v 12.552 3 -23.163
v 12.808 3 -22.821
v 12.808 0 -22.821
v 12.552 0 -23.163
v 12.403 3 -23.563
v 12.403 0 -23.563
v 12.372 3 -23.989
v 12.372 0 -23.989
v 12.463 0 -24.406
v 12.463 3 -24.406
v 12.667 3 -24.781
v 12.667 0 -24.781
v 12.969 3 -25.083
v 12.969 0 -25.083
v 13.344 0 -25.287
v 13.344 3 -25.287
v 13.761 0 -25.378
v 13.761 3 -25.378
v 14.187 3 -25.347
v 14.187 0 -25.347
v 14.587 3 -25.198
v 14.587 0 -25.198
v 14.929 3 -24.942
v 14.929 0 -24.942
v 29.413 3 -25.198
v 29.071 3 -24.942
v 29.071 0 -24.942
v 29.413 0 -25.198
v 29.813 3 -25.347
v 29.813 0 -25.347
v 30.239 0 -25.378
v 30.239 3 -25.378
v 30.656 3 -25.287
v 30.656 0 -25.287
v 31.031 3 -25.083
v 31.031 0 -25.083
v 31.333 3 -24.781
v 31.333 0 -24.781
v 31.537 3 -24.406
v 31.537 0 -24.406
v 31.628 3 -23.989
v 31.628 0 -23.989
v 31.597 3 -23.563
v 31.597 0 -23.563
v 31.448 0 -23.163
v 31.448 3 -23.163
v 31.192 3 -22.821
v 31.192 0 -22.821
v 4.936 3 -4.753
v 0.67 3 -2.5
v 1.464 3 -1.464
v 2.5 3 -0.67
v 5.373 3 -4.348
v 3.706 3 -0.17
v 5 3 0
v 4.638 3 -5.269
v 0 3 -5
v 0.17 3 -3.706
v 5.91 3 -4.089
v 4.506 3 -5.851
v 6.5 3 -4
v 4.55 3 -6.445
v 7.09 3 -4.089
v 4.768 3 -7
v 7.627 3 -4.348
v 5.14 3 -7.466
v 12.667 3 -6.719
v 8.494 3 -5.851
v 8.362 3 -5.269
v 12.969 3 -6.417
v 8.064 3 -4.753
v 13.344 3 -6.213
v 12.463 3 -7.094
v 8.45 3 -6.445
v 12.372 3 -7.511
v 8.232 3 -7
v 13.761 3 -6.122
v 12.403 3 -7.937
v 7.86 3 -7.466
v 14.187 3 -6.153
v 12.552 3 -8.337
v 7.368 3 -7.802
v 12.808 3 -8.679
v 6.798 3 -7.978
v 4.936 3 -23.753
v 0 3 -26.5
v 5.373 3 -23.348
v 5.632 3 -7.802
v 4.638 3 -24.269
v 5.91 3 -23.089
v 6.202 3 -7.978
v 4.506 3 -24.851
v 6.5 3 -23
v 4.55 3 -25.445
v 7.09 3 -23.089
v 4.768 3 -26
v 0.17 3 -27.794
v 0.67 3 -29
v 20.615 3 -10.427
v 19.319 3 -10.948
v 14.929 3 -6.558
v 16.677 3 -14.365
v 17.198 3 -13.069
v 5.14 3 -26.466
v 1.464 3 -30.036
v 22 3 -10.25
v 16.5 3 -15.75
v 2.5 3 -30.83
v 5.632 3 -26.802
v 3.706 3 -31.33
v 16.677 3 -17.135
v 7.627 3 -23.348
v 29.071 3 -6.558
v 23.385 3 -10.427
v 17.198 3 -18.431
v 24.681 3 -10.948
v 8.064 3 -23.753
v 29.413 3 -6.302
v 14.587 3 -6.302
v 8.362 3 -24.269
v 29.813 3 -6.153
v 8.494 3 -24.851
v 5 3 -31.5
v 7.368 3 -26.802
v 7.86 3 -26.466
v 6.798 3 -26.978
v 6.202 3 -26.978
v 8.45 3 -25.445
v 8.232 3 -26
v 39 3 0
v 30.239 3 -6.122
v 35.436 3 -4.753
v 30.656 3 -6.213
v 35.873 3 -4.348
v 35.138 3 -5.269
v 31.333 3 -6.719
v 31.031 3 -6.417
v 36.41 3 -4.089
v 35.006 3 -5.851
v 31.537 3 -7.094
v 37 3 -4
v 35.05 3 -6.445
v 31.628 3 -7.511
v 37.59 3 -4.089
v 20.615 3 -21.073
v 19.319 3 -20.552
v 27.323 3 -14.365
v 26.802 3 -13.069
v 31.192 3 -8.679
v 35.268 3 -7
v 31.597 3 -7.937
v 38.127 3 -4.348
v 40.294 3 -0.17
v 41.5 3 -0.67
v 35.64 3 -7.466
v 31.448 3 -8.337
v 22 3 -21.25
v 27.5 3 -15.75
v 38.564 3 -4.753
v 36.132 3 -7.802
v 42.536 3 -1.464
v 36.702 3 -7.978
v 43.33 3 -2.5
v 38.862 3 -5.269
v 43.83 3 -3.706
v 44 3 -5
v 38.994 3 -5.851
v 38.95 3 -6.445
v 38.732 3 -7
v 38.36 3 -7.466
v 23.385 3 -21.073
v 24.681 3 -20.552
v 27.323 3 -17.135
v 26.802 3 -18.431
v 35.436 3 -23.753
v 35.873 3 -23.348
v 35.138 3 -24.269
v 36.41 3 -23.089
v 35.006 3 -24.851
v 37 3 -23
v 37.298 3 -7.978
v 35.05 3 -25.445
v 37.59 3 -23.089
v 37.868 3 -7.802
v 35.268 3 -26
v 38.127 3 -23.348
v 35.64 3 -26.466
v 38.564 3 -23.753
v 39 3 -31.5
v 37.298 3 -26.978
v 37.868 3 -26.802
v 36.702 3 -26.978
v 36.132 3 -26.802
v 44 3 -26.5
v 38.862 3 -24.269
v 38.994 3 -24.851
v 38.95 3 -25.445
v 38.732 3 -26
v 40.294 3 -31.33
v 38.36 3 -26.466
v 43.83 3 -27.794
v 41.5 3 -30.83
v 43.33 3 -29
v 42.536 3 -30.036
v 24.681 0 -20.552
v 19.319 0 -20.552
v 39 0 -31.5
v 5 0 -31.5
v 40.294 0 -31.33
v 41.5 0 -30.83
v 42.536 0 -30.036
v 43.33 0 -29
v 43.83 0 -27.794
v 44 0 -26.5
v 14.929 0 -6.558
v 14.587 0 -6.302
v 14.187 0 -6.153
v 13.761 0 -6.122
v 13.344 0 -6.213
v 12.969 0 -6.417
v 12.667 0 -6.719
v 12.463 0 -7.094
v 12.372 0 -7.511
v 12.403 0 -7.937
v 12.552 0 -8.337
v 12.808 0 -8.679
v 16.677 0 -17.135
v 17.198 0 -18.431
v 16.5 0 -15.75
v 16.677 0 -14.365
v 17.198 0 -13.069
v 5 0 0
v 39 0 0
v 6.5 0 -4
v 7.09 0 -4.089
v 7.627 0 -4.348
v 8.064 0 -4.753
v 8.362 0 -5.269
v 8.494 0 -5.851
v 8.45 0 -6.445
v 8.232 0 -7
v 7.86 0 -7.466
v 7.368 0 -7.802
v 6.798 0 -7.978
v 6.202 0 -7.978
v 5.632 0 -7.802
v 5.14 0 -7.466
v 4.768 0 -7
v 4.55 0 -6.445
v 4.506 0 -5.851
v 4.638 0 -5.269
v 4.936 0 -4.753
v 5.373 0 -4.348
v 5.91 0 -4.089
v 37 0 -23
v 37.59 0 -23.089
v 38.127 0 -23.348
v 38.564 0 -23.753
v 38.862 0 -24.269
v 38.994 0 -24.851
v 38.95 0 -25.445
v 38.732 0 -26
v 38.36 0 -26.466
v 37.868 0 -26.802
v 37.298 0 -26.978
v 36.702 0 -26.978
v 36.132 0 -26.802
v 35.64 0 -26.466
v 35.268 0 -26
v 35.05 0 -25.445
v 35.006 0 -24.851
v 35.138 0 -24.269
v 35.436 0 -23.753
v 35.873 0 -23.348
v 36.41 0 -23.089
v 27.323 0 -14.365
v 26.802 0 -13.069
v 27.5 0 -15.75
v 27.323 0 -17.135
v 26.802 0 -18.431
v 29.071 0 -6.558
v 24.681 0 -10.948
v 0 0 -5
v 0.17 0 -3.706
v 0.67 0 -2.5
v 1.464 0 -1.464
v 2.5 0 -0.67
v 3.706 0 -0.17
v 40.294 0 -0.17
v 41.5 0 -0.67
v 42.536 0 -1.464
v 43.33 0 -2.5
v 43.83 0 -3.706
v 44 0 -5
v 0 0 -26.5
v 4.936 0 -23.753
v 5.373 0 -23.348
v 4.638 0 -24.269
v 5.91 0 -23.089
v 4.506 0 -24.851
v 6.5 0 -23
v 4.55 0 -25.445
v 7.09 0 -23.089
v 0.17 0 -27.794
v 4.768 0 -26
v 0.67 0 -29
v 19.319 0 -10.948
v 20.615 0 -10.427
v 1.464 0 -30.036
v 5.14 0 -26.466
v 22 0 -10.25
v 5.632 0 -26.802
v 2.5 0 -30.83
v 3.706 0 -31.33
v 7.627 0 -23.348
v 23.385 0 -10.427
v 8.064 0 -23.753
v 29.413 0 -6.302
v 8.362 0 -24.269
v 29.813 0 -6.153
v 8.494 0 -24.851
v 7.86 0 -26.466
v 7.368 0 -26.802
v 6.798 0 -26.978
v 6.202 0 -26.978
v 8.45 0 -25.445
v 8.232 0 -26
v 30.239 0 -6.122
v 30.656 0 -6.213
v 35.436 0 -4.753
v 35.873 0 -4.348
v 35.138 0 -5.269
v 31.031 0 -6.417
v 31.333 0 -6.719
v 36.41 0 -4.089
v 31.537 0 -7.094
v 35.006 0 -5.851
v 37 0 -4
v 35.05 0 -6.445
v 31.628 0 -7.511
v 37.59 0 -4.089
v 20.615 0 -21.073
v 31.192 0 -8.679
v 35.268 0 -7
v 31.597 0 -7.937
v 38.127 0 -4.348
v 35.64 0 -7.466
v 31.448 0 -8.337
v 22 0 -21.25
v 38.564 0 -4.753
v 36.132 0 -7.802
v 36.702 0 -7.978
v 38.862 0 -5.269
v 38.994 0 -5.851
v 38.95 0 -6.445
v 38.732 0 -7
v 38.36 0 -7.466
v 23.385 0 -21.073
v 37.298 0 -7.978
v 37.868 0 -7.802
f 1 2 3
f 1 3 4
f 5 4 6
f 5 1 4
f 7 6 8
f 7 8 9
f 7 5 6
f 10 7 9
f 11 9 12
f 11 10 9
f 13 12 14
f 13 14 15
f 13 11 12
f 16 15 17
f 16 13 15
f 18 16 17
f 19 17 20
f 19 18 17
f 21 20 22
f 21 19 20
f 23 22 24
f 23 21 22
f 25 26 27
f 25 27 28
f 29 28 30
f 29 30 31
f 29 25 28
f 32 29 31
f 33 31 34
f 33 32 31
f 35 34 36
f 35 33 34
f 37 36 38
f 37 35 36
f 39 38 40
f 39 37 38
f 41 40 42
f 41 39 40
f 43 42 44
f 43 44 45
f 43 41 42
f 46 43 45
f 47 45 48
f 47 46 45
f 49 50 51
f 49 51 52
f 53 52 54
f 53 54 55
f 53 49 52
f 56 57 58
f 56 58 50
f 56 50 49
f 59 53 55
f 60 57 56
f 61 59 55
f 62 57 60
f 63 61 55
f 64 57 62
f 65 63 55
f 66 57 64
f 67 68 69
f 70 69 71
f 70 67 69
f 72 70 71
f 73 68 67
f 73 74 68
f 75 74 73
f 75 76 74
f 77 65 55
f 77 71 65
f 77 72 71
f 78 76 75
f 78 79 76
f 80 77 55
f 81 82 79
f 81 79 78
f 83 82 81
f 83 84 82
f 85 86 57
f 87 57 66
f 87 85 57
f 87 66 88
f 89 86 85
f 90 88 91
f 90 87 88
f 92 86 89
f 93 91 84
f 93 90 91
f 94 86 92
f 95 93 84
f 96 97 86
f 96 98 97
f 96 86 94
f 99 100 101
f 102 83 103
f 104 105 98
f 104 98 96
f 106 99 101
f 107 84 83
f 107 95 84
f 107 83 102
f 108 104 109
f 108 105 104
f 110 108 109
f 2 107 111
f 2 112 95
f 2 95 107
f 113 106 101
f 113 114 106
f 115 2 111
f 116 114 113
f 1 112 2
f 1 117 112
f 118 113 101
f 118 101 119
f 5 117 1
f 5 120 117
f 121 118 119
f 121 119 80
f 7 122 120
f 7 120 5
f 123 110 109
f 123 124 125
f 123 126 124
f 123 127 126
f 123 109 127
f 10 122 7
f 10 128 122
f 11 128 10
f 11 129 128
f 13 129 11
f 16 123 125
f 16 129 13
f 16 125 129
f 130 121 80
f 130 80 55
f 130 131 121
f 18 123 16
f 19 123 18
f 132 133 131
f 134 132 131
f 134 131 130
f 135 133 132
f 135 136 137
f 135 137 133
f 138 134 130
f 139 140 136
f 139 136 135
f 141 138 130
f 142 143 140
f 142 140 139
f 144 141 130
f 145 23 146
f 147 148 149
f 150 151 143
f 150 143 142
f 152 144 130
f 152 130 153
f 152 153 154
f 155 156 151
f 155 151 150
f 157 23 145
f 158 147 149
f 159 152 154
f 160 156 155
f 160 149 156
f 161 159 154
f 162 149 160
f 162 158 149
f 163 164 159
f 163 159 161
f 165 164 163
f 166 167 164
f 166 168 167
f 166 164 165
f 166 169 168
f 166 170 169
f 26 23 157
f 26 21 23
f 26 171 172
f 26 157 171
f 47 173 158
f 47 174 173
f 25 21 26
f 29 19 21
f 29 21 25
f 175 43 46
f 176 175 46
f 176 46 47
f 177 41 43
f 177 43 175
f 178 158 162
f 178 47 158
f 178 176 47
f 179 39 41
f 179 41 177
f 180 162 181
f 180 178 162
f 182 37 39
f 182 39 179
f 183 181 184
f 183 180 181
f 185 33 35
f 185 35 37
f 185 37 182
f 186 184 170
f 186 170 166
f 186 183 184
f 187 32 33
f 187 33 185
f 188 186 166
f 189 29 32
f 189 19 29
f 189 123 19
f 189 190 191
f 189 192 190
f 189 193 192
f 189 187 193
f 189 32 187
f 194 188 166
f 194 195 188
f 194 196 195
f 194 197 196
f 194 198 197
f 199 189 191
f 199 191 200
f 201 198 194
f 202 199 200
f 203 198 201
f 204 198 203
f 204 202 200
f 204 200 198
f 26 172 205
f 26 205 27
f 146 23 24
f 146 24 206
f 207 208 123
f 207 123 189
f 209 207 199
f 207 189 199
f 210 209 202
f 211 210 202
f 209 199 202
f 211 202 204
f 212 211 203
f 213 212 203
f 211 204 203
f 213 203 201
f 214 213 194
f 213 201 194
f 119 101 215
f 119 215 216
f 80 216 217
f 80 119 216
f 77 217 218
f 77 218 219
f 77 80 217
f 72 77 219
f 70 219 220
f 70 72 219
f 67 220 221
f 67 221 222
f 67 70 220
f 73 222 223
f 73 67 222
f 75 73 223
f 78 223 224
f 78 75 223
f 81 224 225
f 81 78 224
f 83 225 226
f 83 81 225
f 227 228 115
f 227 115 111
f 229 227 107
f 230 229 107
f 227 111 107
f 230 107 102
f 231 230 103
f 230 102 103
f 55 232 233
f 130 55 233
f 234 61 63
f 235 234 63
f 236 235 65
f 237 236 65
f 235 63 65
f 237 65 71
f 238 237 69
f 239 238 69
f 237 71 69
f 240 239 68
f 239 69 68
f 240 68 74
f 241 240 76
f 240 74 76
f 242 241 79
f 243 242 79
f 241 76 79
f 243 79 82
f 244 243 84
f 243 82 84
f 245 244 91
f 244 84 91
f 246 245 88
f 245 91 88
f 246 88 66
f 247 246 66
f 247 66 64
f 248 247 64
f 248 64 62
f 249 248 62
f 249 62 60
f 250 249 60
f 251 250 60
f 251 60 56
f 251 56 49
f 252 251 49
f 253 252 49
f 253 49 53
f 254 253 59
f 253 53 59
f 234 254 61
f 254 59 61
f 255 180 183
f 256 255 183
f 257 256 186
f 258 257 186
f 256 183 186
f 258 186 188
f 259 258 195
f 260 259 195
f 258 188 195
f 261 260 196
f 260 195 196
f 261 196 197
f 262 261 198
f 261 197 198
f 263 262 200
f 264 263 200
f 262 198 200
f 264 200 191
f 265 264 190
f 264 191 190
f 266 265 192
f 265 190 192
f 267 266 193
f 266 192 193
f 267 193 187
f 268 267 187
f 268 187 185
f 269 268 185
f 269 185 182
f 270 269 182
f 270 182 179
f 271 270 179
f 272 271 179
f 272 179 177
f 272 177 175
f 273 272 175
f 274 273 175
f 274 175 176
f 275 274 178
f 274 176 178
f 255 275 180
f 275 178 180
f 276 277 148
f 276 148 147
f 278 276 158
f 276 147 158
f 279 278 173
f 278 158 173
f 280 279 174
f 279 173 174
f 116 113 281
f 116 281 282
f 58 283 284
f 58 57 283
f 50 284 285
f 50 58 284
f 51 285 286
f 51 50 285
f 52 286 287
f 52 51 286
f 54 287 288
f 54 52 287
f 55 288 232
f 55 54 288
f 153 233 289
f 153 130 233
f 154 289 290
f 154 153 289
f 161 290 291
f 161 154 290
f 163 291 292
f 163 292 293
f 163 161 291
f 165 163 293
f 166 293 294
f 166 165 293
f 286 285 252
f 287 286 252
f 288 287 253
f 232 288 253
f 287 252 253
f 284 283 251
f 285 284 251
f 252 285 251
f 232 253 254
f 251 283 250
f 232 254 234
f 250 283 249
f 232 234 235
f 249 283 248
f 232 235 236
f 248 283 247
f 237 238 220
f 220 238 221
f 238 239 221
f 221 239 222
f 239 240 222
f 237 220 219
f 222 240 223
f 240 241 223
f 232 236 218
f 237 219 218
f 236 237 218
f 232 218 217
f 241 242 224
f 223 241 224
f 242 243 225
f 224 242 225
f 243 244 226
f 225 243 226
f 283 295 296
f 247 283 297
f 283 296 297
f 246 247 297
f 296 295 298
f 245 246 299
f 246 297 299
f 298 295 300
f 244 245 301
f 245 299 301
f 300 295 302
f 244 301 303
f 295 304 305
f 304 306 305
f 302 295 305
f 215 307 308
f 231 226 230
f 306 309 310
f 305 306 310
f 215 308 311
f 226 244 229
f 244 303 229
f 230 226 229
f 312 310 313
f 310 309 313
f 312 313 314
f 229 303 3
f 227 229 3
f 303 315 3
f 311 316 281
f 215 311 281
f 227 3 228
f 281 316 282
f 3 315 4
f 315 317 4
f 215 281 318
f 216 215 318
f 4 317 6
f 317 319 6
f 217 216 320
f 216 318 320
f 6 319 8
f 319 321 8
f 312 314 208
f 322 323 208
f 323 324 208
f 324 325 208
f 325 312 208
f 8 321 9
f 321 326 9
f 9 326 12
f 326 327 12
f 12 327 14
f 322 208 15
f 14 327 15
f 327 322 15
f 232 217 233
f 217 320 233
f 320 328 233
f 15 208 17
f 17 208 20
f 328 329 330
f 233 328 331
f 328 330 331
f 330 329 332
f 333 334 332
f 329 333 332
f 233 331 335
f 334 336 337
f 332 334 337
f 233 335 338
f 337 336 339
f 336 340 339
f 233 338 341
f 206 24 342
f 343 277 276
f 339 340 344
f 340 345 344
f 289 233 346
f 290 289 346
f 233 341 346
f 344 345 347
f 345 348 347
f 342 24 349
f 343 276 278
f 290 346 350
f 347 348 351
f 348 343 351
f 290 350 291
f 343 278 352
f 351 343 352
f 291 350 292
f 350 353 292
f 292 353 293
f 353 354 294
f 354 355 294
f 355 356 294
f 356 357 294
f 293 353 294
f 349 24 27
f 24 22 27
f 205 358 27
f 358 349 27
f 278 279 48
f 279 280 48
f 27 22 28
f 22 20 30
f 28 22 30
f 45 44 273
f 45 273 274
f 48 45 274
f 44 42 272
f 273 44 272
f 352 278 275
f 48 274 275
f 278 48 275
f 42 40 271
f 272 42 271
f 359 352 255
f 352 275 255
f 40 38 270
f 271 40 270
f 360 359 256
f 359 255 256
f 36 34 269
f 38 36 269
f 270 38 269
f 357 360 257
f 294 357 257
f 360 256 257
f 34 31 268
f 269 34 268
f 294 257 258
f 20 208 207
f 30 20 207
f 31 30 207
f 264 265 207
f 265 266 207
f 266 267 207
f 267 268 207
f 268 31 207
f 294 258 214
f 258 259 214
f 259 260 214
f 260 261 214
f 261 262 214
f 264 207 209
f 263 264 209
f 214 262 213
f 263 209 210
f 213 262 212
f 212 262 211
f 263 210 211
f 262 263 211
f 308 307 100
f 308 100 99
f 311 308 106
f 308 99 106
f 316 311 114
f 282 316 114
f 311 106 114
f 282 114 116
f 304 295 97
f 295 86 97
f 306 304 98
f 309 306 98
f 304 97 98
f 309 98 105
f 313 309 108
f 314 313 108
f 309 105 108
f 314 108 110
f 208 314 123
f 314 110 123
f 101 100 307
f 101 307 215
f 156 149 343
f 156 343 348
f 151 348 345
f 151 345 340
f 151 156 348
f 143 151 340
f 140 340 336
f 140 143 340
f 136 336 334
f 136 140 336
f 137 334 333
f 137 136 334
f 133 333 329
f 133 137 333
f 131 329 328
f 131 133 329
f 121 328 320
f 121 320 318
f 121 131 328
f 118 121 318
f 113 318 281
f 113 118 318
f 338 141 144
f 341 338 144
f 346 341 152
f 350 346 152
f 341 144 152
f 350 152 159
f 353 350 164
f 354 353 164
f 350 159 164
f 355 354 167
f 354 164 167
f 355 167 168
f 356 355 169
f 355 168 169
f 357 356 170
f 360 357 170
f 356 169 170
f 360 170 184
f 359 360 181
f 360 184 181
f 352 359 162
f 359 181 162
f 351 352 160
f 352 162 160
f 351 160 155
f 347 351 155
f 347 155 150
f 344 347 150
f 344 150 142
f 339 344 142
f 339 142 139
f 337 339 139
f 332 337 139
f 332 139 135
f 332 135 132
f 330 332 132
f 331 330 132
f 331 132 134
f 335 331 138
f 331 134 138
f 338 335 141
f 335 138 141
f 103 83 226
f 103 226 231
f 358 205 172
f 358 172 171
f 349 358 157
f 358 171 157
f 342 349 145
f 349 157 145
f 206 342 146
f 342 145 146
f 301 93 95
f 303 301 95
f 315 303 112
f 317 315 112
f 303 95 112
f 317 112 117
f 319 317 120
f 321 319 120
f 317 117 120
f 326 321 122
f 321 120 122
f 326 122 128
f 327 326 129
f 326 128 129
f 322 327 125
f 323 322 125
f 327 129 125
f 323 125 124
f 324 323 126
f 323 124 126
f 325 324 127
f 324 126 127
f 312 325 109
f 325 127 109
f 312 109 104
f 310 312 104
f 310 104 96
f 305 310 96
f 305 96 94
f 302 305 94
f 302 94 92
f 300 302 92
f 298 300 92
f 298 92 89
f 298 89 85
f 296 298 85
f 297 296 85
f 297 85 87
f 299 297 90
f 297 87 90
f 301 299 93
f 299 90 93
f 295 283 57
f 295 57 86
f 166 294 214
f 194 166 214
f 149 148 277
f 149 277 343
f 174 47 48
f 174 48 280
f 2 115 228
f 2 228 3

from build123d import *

# Parameters (mm, degrees)
SKETCH1_W            = 44
SKETCH1_H            = 31.5
BOSS_EXTRUDE1_DEPTH  = 3
SKETCH2_R            = 5.5
CUT_EXTRUDE1_DEPTH   = 3
CUT_EXTRUDE2_DEPTH   = 3
CUT_EXTRUDE3_DEPTH   = 3
SKETCH5_R            = 2
CUT_EXTRUDE4_DEPTH   = 3
LPATTERN1_COUNT      = 2
LPATTERN1_PITCH      = 30.5
LPATTERN1_COUNT_DIR2 = 2
LPATTERN1_PITCH_DIR2 = 19
FILLET1_R            = 5


with BuildPart() as part:
    # Sketch1 → Boss-Extrude1 (new body)
    with BuildSketch(Plane(origin=(0, 0, 0), x_dir=(1, 0, 0), z_dir=(0, 1, 0))):
        with Locations((22, 15.75)):
            Rectangle(SKETCH1_W, SKETCH1_H)
    extrude(amount=BOSS_EXTRUDE1_DEPTH)

    # Sketch2 → Cut-Extrude1 (cut)
    with BuildSketch(Plane(origin=(0, 3, 0), x_dir=(1, 0, 0), z_dir=(0, 1, 0))):
        with Locations(Location((22, 15.75, 0), (0, 0, 270))):
            Circle(SKETCH2_R)
    extrude(amount=-CUT_EXTRUDE1_DEPTH, mode=Mode.SUBTRACT)

    # Sketch3 → Cut-Extrude2 (cut)
    with BuildSketch(Plane(origin=(0, 3, 0), x_dir=(1, 0, 0), z_dir=(0, 1, 0))):
        with BuildLine():
            Line((14.928932188, 24.942388155), (31.192388155, 8.678932188))
            ThreePointArc((31.192388155, 8.678932188), (31.192388155, 6.557611845), (29.071067812, 6.557611845))
            Line((29.071067812, 6.557611845), (12.807611845, 22.821067812))
            ThreePointArc((12.807611845, 22.821067812), (12.807611845, 24.942388155), (14.928932188, 24.942388155))
        make_face()
    extrude(amount=-CUT_EXTRUDE2_DEPTH, mode=Mode.SUBTRACT)

    # Sketch4 → Cut-Extrude3 (cut)
    with BuildSketch(Plane(origin=(0, 3, 0), x_dir=(1, 0, 0), z_dir=(0, 1, 0))):
        with BuildLine():
            Line((31.192388155, 22.821067812), (14.928932188, 6.557611845))
            ThreePointArc((14.928932188, 6.557611845), (12.807611845, 6.557611845), (12.807611845, 8.678932188))
            Line((12.807611845, 8.678932188), (29.071067812, 24.942388155))
            ThreePointArc((29.071067812, 24.942388155), (31.192388155, 24.942388155), (31.192388155, 22.821067812))
        make_face()
    extrude(amount=-CUT_EXTRUDE3_DEPTH, mode=Mode.SUBTRACT)

    # Sketch5 → Cut-Extrude4 (cut)
    with BuildSketch(Plane(origin=(0, 3, 0), x_dir=(1, 0, 0), z_dir=(0, 1, 0))):
        with Locations(Location((6.5, 25, 0), (0, 0, 270))):
            Circle(SKETCH5_R)
    cut_extrude4 = extrude(amount=-CUT_EXTRUDE4_DEPTH, mode=Mode.SUBTRACT)

    # LPattern1: Cut-Extrude4 2 × 2
    with Locations(*[(i * LPATTERN1_PITCH, 0, j * LPATTERN1_PITCH_DIR2) for i in range(LPATTERN1_COUNT) for j in range(LPATTERN1_COUNT_DIR2) if (i, j) != (0, 0)]):
        add(cut_extrude4, mode=Mode.SUBTRACT)

    # Fillet1
    fillet1_edges = [part.edges().sort_by_distance(p)[0] for p in [
        (0, 1.5, -31.5),
        (44, 1.5, -31.5),
        (44, 1.5, 0),
        (0, 1.5, 0),
    ]]
    fillet(fillet1_edges, radius=FILLET1_R)


solid = part.part
